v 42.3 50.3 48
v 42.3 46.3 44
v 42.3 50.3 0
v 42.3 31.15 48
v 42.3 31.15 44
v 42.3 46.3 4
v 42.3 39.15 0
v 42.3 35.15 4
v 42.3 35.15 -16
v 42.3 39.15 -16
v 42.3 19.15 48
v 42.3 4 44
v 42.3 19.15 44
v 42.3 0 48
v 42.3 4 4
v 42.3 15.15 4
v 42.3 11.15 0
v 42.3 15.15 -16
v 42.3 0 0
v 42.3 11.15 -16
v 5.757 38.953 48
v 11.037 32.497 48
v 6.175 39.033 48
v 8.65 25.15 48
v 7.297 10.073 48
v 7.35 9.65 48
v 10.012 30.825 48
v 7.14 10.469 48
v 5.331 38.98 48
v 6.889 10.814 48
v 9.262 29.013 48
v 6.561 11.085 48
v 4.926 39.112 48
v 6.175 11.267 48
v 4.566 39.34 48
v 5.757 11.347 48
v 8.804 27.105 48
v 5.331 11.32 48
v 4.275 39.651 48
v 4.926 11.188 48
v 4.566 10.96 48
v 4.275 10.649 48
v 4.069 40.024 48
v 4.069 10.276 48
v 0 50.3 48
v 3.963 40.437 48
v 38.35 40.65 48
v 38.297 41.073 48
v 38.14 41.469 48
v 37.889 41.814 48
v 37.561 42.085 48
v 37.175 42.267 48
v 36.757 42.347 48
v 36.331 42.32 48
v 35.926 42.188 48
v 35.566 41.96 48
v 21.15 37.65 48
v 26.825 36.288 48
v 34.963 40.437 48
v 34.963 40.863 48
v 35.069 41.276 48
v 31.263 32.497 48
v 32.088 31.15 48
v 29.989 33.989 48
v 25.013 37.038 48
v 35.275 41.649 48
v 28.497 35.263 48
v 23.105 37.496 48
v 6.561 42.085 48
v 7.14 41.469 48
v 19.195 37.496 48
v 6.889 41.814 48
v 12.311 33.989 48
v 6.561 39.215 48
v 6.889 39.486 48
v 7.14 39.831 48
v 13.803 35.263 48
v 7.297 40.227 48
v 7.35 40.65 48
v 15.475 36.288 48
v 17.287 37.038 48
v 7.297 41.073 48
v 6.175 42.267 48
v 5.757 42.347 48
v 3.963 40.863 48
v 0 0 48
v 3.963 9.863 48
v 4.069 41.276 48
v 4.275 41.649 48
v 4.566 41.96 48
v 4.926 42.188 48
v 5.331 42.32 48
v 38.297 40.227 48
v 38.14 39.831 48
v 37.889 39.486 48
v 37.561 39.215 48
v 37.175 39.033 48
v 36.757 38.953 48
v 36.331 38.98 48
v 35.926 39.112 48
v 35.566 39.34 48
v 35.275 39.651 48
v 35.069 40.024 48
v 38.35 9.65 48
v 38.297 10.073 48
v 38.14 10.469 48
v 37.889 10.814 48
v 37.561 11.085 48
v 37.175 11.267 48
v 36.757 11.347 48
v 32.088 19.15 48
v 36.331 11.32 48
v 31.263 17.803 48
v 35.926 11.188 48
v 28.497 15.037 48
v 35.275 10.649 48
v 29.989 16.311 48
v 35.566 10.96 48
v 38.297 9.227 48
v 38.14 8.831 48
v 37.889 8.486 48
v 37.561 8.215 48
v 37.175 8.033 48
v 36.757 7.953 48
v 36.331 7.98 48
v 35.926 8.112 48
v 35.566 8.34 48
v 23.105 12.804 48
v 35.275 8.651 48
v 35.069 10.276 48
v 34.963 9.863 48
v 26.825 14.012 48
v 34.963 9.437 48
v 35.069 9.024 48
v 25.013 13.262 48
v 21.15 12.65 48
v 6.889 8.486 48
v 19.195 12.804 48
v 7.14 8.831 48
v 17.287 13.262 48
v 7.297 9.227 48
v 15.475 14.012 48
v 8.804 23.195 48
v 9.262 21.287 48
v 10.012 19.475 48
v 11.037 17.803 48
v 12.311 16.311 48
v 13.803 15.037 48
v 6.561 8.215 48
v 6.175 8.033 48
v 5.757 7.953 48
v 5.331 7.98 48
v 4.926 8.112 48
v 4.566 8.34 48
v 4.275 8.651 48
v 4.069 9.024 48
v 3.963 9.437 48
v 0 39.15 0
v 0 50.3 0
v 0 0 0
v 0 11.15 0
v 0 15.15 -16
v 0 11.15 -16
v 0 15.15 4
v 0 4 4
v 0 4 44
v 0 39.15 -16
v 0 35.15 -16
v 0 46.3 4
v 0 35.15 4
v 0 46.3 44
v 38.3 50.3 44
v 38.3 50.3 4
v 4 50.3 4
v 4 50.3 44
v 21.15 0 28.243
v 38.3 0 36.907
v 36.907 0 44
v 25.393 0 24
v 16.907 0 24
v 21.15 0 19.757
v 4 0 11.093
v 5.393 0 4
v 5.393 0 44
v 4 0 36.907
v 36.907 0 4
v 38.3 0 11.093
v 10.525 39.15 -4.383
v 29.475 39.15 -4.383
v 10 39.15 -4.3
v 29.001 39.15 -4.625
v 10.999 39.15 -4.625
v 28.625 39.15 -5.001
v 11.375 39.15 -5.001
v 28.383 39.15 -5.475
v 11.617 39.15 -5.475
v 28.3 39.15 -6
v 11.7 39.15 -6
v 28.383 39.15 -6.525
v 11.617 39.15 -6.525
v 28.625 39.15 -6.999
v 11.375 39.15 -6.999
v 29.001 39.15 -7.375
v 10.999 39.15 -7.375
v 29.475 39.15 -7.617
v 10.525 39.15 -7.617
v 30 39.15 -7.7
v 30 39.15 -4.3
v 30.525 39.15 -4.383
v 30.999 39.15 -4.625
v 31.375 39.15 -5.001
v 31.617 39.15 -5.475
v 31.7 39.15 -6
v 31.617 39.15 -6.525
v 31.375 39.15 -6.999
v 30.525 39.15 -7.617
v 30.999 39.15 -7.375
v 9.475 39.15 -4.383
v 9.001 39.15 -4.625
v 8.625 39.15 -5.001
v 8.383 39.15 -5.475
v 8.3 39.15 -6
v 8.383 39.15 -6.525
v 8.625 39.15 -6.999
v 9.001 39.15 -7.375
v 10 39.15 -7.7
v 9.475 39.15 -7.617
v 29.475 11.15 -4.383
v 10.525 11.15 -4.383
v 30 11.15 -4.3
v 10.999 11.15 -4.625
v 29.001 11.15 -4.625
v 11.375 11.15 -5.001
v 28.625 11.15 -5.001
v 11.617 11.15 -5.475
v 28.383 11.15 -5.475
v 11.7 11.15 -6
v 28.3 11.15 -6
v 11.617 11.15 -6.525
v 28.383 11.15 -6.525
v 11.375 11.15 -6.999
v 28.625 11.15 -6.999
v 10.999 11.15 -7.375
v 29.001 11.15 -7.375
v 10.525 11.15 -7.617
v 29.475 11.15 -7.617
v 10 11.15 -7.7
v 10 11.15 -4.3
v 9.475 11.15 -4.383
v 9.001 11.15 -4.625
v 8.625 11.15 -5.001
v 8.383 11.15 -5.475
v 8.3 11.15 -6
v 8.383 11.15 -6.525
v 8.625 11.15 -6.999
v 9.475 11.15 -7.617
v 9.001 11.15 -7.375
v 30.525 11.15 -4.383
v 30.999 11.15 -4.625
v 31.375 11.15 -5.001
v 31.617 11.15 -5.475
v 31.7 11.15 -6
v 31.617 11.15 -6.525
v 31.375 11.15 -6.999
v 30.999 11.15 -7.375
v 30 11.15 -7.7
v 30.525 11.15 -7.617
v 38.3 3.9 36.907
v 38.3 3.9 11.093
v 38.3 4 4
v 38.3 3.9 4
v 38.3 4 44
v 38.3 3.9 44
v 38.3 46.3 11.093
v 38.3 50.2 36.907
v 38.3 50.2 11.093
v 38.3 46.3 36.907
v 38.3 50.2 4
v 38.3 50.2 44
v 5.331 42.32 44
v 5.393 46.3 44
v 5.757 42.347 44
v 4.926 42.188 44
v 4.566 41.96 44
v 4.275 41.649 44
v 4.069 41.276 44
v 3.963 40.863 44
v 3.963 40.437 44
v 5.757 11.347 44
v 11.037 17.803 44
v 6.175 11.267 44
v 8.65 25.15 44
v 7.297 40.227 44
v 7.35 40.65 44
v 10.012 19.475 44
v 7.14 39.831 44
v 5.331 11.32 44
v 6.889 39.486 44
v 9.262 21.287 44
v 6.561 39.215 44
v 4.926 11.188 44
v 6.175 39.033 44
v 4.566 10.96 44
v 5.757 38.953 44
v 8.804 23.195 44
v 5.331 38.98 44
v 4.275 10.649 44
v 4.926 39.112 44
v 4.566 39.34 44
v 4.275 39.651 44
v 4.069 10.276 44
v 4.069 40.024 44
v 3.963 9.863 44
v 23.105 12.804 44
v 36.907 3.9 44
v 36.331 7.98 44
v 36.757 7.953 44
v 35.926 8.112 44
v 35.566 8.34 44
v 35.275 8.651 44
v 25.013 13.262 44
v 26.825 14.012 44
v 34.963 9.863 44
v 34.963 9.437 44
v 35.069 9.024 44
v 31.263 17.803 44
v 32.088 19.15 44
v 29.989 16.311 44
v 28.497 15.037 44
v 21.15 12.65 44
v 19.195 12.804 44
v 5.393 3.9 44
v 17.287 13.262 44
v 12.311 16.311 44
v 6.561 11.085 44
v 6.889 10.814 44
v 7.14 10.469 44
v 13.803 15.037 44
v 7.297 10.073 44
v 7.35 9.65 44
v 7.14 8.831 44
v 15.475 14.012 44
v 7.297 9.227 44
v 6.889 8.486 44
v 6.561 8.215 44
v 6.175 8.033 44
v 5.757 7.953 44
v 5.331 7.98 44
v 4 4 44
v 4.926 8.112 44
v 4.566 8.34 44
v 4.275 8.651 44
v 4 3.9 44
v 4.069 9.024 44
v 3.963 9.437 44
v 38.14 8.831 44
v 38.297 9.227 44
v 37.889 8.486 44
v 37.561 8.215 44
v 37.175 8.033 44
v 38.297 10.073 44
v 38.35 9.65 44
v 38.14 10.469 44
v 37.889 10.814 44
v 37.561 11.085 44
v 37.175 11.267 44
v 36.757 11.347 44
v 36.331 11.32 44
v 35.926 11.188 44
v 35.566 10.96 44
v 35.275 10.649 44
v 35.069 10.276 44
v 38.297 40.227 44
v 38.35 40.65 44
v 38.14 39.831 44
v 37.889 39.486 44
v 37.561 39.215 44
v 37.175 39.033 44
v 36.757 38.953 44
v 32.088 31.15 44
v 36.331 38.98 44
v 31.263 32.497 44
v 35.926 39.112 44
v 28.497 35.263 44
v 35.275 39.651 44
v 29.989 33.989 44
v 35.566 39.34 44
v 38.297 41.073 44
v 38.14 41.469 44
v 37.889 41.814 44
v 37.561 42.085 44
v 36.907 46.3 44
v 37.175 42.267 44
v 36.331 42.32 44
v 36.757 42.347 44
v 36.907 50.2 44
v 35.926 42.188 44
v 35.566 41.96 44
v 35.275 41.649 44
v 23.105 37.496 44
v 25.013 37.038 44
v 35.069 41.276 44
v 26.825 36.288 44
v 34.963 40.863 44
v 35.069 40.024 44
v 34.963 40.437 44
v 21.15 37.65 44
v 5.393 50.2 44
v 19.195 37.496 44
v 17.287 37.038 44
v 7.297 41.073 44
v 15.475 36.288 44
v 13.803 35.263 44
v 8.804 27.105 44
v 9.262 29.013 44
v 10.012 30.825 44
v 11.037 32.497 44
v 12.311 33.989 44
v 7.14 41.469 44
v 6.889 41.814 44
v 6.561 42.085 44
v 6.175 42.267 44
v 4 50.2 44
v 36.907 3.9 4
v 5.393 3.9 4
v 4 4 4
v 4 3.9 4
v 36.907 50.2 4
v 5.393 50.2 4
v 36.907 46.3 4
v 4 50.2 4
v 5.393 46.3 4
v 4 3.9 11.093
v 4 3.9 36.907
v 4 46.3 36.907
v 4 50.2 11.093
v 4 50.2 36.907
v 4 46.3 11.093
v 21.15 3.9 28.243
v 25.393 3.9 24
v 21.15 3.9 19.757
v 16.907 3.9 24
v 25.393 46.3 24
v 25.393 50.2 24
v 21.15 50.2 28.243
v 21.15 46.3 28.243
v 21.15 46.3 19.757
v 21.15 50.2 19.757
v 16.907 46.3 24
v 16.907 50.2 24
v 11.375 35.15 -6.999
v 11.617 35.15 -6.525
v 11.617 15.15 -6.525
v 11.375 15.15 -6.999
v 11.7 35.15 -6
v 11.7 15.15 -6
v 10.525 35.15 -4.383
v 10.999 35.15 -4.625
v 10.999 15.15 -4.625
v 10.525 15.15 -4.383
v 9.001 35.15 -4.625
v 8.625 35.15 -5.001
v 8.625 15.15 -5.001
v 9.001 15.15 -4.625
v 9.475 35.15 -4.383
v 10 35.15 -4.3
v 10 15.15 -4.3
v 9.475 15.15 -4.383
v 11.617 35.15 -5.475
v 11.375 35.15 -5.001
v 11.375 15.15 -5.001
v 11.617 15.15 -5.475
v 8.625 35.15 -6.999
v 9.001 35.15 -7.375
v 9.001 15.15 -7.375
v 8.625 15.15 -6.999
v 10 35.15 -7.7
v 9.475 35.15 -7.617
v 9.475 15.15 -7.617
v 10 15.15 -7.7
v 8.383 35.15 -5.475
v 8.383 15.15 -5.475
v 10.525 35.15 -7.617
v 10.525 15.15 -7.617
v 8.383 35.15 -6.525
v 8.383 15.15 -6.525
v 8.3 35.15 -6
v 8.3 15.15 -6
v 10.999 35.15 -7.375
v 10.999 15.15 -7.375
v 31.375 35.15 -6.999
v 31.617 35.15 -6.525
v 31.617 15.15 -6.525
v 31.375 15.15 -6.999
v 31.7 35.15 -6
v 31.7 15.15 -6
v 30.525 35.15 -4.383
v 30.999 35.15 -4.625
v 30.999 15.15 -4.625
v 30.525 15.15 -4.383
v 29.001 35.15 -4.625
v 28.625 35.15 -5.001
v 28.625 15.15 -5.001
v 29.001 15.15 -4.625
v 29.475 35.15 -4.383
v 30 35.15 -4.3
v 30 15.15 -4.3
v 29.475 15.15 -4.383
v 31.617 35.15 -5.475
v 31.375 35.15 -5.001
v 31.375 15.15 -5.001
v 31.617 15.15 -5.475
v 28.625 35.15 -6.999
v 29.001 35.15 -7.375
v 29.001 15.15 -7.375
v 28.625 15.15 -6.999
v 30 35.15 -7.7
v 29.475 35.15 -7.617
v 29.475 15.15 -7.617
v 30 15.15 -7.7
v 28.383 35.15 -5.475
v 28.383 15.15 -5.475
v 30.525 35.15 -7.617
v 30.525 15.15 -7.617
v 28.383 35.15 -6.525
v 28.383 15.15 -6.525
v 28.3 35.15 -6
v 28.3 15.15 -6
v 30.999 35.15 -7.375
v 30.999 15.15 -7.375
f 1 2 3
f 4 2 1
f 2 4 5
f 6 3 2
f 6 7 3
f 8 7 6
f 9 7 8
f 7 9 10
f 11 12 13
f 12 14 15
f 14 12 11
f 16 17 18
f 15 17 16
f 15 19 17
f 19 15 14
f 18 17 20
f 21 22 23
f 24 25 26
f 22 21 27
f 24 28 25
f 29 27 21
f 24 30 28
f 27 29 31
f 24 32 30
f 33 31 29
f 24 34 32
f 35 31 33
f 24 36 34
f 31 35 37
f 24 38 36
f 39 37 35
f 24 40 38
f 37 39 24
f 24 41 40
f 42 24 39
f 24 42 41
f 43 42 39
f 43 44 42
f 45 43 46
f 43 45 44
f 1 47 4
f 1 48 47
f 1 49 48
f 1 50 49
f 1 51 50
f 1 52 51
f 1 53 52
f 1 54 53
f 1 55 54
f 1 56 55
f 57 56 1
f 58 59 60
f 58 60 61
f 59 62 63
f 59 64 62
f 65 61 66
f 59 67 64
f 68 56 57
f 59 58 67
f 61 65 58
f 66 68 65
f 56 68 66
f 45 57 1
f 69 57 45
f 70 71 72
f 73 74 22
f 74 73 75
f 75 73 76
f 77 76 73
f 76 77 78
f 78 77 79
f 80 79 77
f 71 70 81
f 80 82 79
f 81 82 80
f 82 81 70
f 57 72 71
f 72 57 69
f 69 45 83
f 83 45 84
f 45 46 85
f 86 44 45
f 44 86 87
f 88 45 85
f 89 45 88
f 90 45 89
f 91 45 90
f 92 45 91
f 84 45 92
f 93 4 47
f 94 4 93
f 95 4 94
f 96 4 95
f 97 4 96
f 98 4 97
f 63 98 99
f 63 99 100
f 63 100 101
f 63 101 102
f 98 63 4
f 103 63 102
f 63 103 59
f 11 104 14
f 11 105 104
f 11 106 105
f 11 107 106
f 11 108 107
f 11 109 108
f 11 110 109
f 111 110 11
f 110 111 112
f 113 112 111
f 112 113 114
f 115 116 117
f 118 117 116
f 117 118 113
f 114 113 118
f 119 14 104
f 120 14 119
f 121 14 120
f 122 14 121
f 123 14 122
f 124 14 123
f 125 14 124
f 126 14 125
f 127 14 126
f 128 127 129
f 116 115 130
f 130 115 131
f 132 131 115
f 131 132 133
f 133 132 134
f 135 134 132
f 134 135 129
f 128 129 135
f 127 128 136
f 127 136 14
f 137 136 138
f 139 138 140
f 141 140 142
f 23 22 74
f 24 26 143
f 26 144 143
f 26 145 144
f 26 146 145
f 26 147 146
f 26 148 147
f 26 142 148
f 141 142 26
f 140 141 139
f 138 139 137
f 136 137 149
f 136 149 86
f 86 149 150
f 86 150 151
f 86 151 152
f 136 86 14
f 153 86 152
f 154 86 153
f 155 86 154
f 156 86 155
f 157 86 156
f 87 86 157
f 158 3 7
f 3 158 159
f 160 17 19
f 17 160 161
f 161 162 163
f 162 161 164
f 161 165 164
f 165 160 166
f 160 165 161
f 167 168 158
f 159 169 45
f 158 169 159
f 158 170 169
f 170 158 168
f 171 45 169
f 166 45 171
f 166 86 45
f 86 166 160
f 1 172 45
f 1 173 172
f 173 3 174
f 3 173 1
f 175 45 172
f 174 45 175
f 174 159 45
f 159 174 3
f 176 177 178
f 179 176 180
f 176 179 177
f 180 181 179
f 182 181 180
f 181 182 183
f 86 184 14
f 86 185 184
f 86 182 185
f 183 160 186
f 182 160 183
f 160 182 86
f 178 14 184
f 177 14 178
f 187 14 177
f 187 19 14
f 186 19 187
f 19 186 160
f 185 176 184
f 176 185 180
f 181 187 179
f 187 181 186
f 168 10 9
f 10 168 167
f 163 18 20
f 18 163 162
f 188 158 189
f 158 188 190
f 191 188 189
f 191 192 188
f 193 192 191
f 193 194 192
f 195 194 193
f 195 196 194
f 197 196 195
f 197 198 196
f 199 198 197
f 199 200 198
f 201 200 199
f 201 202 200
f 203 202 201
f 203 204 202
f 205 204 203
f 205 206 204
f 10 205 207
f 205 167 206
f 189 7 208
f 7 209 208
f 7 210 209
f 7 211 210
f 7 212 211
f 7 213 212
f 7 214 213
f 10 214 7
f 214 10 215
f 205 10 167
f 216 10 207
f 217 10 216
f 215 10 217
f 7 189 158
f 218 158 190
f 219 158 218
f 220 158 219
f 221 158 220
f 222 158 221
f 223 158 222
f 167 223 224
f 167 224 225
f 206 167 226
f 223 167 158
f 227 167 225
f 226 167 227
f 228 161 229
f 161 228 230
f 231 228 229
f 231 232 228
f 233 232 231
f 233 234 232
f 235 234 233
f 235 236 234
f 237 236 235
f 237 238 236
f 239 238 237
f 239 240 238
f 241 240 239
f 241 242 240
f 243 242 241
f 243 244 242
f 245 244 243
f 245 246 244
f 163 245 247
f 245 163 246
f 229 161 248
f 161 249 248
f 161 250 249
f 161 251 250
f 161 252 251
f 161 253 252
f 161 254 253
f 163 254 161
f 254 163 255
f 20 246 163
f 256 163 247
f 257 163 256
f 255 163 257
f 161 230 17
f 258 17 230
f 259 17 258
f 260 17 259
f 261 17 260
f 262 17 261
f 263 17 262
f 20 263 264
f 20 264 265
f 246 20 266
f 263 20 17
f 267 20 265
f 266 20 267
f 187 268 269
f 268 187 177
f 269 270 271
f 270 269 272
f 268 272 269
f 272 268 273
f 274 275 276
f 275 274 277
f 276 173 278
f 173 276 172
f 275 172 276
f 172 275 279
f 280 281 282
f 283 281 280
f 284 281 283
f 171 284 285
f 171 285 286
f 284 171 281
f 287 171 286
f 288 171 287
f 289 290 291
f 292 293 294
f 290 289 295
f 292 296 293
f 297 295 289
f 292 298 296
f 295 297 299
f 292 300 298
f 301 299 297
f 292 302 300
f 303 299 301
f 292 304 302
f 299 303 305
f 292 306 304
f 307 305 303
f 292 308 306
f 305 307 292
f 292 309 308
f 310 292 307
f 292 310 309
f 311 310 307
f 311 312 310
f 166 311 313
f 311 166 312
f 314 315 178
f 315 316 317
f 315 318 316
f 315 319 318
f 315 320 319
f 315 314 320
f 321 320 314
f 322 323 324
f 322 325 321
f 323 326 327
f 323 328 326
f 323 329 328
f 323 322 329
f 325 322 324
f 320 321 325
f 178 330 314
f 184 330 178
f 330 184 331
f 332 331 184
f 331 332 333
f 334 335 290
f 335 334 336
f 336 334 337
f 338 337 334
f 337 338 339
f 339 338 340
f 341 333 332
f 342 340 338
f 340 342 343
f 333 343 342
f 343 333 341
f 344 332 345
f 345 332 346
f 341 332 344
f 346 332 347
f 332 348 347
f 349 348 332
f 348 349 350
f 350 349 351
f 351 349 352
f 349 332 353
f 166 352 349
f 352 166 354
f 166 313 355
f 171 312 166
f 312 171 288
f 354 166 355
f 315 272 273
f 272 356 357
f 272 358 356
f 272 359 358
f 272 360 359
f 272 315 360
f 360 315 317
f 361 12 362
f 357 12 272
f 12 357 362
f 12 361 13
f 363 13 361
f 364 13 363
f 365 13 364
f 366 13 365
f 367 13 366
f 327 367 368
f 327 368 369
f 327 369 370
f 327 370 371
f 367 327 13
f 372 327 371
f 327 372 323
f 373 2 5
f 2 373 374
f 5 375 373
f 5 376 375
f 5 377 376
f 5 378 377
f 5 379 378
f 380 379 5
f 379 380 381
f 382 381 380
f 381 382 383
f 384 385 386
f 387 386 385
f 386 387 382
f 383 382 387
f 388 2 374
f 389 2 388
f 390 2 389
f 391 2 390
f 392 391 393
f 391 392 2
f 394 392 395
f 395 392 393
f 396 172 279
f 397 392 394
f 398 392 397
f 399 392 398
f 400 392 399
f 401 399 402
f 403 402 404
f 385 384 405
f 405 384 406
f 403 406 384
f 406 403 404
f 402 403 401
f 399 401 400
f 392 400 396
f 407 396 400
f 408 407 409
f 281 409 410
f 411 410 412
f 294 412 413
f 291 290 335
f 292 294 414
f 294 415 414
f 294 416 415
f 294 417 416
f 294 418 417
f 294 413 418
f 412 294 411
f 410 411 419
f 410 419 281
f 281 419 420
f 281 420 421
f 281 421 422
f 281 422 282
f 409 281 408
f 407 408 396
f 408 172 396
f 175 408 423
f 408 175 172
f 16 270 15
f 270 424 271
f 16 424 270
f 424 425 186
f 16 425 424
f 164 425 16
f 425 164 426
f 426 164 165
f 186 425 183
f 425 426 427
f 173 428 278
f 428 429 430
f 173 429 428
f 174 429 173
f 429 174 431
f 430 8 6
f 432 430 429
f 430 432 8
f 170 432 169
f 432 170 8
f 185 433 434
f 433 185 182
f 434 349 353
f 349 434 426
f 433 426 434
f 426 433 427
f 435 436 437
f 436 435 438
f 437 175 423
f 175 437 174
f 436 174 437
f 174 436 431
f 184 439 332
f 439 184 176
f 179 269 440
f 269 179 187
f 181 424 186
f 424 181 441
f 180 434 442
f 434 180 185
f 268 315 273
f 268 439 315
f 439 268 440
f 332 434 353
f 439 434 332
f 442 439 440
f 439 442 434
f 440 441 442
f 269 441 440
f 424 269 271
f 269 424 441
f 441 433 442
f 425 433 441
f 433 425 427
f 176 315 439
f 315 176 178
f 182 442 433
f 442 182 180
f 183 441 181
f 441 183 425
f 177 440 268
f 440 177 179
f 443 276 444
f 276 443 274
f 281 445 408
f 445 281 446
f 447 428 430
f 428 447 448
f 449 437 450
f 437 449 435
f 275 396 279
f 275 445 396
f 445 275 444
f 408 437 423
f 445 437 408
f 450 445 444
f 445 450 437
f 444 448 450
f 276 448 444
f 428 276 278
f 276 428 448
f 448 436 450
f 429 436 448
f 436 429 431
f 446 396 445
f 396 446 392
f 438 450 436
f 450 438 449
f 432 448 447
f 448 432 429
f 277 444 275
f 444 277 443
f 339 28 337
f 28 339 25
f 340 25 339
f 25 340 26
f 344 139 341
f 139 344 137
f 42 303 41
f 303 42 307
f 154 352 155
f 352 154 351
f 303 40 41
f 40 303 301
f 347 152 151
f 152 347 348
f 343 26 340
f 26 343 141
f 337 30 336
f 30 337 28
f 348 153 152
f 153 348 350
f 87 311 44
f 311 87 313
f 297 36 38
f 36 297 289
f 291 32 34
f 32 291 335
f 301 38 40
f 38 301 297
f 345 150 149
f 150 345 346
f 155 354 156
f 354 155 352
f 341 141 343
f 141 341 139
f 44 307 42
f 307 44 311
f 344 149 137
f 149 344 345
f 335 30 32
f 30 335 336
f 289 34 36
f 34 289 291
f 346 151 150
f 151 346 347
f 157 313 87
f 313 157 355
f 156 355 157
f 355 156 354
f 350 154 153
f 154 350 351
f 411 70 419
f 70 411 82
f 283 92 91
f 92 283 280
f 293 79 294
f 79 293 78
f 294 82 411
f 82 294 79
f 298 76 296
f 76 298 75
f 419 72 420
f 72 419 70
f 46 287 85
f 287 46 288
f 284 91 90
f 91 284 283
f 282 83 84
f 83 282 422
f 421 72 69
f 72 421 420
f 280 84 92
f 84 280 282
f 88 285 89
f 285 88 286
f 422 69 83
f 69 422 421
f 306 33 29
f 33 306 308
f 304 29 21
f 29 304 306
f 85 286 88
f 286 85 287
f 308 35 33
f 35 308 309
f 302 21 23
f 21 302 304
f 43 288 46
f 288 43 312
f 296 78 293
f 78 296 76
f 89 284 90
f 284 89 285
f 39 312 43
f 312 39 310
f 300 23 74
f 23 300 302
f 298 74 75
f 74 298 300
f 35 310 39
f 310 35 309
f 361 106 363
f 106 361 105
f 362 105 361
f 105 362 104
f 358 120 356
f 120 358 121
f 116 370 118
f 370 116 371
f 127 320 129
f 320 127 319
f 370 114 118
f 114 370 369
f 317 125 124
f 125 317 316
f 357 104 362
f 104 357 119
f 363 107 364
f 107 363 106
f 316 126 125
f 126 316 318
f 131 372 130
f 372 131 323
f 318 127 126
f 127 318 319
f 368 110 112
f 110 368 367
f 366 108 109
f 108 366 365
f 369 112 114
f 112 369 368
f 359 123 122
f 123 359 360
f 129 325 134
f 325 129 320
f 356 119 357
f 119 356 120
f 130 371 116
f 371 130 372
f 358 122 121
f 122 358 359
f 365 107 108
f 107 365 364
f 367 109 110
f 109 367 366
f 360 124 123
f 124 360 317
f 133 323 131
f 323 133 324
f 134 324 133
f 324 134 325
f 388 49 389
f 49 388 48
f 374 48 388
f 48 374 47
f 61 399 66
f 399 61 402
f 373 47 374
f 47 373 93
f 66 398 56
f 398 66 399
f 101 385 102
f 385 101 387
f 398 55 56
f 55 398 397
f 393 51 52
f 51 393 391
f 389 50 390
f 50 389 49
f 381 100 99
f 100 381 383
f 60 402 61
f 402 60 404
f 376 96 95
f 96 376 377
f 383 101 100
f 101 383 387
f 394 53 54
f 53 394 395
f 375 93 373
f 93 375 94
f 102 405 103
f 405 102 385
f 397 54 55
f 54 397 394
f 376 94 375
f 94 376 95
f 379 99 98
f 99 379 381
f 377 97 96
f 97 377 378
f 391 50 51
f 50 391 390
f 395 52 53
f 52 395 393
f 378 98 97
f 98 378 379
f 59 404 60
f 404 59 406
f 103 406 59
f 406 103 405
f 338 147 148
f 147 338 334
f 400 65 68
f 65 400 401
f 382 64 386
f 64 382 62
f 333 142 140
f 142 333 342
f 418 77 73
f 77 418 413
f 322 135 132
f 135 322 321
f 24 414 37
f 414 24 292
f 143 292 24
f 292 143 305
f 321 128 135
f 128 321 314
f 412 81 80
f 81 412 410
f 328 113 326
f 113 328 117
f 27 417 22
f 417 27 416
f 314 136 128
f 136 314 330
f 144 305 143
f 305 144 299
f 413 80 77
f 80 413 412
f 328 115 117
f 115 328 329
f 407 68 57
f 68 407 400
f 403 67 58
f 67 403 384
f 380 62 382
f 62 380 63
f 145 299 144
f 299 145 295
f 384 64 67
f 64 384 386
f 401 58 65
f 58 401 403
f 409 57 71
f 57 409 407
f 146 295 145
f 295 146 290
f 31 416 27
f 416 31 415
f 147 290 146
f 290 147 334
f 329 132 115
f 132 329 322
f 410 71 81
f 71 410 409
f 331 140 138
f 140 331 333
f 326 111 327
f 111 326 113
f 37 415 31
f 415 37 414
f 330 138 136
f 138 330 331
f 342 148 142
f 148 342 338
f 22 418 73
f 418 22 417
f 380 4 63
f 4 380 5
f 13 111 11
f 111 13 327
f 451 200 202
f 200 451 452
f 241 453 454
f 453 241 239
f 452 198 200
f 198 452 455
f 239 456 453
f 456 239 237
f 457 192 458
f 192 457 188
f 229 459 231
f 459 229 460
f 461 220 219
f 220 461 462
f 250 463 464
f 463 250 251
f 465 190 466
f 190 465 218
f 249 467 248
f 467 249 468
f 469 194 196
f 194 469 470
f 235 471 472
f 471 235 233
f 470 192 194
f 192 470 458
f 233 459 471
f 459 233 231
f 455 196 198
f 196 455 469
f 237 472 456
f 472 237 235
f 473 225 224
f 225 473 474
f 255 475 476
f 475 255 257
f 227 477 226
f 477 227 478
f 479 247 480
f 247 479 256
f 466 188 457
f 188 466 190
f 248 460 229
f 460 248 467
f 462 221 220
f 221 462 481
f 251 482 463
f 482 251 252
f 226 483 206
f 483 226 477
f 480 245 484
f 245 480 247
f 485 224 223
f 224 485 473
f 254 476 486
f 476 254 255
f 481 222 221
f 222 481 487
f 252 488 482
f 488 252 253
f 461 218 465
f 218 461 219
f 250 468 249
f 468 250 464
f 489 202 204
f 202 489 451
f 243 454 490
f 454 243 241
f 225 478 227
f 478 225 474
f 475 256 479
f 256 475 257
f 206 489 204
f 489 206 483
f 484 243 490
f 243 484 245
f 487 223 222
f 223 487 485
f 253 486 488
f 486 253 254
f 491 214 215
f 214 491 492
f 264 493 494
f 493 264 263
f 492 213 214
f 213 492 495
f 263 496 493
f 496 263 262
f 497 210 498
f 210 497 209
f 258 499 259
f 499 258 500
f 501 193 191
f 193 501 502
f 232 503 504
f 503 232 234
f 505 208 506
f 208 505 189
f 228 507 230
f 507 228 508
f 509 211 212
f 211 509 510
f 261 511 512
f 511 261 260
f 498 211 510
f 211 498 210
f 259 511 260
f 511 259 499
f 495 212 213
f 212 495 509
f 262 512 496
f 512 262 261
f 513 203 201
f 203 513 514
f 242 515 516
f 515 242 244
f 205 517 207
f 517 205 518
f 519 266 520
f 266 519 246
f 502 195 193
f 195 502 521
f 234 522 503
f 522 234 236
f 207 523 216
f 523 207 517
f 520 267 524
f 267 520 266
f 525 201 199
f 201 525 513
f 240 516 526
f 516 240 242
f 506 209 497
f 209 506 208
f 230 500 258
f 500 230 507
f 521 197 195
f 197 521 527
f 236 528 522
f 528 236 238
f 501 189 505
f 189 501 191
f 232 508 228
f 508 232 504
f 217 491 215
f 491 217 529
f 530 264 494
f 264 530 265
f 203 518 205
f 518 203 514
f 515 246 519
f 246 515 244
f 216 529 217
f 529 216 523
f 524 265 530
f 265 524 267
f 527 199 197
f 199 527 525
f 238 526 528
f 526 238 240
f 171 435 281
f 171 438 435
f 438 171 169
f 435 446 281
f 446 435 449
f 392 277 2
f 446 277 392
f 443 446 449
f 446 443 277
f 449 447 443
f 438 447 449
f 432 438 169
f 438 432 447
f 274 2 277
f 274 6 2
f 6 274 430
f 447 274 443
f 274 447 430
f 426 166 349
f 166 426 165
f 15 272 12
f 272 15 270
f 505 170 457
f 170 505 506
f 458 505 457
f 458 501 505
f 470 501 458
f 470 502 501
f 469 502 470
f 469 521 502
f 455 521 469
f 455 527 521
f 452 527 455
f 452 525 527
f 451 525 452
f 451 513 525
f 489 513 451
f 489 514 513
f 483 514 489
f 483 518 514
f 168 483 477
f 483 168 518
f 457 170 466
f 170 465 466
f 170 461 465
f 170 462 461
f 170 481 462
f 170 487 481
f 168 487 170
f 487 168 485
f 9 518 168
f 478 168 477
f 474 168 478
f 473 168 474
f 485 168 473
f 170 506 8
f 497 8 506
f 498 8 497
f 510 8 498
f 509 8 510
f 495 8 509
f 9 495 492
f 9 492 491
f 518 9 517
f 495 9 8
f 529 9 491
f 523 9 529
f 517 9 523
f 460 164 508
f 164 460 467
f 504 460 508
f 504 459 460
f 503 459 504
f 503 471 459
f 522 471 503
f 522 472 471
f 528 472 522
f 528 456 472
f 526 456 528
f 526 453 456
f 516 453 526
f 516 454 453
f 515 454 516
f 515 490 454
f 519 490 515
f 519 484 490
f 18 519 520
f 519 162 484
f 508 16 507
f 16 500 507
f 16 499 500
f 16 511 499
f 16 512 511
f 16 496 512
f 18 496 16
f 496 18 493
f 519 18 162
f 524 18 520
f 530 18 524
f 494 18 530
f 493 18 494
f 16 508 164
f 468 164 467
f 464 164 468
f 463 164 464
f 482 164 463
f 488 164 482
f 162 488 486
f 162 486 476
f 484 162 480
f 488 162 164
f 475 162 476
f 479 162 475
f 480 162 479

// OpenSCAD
difference() {
	union() {
		cube([42.3, 42.3+8, 40+8]);
		translate([0, 11.15, -16]) cube([42.3, 28, 20]);
	}
	translate([-0.1, 4, 4]) cube([42.5, 42.3, 40]);
	translate([4, -0.1, 4]) difference() {
		cube([42.3-8, 53, 40]);
		translate([21.15-4, 2, 20]) rotate([0, 45, 0]) cube([55, 4, 6], center=true);
		translate([21.15-4, 2, 20]) rotate([0, -45, 0]) cube([55, 4, 6], center=true);
		translate([21.15-4, 42.3+6, 20]) rotate([0, 45, 0]) cube([55, 4, 6], center=true);
		translate([21.15-4, 42.3+6, 20]) rotate([0, -45, 0]) cube([55, 4, 6], center=true);
	}
	translate([21.15, 25.15, 40]) {
		cylinder(r=12.5, h=10, $fn=40);
		d = 15.5;
		for(i=[-d, d]) {
			for(j=[-d, d]) {
				translate([i, j, 0]) cylinder(r=1.7, h=10, $fn=25);
			}
		}
		translate([20, 0, 5]) cube([20, 12, 10], center=true);
	}
	translate([-0.1, 4+21.15-10, -16.1]) cube([50, 20, 20.2]);
	for(i=[10, 30]) {
		translate([i, 0, -6]) rotate([-90, 0, 0]) cylinder(r=1.7, h=50, $fn=20);
	}
}
